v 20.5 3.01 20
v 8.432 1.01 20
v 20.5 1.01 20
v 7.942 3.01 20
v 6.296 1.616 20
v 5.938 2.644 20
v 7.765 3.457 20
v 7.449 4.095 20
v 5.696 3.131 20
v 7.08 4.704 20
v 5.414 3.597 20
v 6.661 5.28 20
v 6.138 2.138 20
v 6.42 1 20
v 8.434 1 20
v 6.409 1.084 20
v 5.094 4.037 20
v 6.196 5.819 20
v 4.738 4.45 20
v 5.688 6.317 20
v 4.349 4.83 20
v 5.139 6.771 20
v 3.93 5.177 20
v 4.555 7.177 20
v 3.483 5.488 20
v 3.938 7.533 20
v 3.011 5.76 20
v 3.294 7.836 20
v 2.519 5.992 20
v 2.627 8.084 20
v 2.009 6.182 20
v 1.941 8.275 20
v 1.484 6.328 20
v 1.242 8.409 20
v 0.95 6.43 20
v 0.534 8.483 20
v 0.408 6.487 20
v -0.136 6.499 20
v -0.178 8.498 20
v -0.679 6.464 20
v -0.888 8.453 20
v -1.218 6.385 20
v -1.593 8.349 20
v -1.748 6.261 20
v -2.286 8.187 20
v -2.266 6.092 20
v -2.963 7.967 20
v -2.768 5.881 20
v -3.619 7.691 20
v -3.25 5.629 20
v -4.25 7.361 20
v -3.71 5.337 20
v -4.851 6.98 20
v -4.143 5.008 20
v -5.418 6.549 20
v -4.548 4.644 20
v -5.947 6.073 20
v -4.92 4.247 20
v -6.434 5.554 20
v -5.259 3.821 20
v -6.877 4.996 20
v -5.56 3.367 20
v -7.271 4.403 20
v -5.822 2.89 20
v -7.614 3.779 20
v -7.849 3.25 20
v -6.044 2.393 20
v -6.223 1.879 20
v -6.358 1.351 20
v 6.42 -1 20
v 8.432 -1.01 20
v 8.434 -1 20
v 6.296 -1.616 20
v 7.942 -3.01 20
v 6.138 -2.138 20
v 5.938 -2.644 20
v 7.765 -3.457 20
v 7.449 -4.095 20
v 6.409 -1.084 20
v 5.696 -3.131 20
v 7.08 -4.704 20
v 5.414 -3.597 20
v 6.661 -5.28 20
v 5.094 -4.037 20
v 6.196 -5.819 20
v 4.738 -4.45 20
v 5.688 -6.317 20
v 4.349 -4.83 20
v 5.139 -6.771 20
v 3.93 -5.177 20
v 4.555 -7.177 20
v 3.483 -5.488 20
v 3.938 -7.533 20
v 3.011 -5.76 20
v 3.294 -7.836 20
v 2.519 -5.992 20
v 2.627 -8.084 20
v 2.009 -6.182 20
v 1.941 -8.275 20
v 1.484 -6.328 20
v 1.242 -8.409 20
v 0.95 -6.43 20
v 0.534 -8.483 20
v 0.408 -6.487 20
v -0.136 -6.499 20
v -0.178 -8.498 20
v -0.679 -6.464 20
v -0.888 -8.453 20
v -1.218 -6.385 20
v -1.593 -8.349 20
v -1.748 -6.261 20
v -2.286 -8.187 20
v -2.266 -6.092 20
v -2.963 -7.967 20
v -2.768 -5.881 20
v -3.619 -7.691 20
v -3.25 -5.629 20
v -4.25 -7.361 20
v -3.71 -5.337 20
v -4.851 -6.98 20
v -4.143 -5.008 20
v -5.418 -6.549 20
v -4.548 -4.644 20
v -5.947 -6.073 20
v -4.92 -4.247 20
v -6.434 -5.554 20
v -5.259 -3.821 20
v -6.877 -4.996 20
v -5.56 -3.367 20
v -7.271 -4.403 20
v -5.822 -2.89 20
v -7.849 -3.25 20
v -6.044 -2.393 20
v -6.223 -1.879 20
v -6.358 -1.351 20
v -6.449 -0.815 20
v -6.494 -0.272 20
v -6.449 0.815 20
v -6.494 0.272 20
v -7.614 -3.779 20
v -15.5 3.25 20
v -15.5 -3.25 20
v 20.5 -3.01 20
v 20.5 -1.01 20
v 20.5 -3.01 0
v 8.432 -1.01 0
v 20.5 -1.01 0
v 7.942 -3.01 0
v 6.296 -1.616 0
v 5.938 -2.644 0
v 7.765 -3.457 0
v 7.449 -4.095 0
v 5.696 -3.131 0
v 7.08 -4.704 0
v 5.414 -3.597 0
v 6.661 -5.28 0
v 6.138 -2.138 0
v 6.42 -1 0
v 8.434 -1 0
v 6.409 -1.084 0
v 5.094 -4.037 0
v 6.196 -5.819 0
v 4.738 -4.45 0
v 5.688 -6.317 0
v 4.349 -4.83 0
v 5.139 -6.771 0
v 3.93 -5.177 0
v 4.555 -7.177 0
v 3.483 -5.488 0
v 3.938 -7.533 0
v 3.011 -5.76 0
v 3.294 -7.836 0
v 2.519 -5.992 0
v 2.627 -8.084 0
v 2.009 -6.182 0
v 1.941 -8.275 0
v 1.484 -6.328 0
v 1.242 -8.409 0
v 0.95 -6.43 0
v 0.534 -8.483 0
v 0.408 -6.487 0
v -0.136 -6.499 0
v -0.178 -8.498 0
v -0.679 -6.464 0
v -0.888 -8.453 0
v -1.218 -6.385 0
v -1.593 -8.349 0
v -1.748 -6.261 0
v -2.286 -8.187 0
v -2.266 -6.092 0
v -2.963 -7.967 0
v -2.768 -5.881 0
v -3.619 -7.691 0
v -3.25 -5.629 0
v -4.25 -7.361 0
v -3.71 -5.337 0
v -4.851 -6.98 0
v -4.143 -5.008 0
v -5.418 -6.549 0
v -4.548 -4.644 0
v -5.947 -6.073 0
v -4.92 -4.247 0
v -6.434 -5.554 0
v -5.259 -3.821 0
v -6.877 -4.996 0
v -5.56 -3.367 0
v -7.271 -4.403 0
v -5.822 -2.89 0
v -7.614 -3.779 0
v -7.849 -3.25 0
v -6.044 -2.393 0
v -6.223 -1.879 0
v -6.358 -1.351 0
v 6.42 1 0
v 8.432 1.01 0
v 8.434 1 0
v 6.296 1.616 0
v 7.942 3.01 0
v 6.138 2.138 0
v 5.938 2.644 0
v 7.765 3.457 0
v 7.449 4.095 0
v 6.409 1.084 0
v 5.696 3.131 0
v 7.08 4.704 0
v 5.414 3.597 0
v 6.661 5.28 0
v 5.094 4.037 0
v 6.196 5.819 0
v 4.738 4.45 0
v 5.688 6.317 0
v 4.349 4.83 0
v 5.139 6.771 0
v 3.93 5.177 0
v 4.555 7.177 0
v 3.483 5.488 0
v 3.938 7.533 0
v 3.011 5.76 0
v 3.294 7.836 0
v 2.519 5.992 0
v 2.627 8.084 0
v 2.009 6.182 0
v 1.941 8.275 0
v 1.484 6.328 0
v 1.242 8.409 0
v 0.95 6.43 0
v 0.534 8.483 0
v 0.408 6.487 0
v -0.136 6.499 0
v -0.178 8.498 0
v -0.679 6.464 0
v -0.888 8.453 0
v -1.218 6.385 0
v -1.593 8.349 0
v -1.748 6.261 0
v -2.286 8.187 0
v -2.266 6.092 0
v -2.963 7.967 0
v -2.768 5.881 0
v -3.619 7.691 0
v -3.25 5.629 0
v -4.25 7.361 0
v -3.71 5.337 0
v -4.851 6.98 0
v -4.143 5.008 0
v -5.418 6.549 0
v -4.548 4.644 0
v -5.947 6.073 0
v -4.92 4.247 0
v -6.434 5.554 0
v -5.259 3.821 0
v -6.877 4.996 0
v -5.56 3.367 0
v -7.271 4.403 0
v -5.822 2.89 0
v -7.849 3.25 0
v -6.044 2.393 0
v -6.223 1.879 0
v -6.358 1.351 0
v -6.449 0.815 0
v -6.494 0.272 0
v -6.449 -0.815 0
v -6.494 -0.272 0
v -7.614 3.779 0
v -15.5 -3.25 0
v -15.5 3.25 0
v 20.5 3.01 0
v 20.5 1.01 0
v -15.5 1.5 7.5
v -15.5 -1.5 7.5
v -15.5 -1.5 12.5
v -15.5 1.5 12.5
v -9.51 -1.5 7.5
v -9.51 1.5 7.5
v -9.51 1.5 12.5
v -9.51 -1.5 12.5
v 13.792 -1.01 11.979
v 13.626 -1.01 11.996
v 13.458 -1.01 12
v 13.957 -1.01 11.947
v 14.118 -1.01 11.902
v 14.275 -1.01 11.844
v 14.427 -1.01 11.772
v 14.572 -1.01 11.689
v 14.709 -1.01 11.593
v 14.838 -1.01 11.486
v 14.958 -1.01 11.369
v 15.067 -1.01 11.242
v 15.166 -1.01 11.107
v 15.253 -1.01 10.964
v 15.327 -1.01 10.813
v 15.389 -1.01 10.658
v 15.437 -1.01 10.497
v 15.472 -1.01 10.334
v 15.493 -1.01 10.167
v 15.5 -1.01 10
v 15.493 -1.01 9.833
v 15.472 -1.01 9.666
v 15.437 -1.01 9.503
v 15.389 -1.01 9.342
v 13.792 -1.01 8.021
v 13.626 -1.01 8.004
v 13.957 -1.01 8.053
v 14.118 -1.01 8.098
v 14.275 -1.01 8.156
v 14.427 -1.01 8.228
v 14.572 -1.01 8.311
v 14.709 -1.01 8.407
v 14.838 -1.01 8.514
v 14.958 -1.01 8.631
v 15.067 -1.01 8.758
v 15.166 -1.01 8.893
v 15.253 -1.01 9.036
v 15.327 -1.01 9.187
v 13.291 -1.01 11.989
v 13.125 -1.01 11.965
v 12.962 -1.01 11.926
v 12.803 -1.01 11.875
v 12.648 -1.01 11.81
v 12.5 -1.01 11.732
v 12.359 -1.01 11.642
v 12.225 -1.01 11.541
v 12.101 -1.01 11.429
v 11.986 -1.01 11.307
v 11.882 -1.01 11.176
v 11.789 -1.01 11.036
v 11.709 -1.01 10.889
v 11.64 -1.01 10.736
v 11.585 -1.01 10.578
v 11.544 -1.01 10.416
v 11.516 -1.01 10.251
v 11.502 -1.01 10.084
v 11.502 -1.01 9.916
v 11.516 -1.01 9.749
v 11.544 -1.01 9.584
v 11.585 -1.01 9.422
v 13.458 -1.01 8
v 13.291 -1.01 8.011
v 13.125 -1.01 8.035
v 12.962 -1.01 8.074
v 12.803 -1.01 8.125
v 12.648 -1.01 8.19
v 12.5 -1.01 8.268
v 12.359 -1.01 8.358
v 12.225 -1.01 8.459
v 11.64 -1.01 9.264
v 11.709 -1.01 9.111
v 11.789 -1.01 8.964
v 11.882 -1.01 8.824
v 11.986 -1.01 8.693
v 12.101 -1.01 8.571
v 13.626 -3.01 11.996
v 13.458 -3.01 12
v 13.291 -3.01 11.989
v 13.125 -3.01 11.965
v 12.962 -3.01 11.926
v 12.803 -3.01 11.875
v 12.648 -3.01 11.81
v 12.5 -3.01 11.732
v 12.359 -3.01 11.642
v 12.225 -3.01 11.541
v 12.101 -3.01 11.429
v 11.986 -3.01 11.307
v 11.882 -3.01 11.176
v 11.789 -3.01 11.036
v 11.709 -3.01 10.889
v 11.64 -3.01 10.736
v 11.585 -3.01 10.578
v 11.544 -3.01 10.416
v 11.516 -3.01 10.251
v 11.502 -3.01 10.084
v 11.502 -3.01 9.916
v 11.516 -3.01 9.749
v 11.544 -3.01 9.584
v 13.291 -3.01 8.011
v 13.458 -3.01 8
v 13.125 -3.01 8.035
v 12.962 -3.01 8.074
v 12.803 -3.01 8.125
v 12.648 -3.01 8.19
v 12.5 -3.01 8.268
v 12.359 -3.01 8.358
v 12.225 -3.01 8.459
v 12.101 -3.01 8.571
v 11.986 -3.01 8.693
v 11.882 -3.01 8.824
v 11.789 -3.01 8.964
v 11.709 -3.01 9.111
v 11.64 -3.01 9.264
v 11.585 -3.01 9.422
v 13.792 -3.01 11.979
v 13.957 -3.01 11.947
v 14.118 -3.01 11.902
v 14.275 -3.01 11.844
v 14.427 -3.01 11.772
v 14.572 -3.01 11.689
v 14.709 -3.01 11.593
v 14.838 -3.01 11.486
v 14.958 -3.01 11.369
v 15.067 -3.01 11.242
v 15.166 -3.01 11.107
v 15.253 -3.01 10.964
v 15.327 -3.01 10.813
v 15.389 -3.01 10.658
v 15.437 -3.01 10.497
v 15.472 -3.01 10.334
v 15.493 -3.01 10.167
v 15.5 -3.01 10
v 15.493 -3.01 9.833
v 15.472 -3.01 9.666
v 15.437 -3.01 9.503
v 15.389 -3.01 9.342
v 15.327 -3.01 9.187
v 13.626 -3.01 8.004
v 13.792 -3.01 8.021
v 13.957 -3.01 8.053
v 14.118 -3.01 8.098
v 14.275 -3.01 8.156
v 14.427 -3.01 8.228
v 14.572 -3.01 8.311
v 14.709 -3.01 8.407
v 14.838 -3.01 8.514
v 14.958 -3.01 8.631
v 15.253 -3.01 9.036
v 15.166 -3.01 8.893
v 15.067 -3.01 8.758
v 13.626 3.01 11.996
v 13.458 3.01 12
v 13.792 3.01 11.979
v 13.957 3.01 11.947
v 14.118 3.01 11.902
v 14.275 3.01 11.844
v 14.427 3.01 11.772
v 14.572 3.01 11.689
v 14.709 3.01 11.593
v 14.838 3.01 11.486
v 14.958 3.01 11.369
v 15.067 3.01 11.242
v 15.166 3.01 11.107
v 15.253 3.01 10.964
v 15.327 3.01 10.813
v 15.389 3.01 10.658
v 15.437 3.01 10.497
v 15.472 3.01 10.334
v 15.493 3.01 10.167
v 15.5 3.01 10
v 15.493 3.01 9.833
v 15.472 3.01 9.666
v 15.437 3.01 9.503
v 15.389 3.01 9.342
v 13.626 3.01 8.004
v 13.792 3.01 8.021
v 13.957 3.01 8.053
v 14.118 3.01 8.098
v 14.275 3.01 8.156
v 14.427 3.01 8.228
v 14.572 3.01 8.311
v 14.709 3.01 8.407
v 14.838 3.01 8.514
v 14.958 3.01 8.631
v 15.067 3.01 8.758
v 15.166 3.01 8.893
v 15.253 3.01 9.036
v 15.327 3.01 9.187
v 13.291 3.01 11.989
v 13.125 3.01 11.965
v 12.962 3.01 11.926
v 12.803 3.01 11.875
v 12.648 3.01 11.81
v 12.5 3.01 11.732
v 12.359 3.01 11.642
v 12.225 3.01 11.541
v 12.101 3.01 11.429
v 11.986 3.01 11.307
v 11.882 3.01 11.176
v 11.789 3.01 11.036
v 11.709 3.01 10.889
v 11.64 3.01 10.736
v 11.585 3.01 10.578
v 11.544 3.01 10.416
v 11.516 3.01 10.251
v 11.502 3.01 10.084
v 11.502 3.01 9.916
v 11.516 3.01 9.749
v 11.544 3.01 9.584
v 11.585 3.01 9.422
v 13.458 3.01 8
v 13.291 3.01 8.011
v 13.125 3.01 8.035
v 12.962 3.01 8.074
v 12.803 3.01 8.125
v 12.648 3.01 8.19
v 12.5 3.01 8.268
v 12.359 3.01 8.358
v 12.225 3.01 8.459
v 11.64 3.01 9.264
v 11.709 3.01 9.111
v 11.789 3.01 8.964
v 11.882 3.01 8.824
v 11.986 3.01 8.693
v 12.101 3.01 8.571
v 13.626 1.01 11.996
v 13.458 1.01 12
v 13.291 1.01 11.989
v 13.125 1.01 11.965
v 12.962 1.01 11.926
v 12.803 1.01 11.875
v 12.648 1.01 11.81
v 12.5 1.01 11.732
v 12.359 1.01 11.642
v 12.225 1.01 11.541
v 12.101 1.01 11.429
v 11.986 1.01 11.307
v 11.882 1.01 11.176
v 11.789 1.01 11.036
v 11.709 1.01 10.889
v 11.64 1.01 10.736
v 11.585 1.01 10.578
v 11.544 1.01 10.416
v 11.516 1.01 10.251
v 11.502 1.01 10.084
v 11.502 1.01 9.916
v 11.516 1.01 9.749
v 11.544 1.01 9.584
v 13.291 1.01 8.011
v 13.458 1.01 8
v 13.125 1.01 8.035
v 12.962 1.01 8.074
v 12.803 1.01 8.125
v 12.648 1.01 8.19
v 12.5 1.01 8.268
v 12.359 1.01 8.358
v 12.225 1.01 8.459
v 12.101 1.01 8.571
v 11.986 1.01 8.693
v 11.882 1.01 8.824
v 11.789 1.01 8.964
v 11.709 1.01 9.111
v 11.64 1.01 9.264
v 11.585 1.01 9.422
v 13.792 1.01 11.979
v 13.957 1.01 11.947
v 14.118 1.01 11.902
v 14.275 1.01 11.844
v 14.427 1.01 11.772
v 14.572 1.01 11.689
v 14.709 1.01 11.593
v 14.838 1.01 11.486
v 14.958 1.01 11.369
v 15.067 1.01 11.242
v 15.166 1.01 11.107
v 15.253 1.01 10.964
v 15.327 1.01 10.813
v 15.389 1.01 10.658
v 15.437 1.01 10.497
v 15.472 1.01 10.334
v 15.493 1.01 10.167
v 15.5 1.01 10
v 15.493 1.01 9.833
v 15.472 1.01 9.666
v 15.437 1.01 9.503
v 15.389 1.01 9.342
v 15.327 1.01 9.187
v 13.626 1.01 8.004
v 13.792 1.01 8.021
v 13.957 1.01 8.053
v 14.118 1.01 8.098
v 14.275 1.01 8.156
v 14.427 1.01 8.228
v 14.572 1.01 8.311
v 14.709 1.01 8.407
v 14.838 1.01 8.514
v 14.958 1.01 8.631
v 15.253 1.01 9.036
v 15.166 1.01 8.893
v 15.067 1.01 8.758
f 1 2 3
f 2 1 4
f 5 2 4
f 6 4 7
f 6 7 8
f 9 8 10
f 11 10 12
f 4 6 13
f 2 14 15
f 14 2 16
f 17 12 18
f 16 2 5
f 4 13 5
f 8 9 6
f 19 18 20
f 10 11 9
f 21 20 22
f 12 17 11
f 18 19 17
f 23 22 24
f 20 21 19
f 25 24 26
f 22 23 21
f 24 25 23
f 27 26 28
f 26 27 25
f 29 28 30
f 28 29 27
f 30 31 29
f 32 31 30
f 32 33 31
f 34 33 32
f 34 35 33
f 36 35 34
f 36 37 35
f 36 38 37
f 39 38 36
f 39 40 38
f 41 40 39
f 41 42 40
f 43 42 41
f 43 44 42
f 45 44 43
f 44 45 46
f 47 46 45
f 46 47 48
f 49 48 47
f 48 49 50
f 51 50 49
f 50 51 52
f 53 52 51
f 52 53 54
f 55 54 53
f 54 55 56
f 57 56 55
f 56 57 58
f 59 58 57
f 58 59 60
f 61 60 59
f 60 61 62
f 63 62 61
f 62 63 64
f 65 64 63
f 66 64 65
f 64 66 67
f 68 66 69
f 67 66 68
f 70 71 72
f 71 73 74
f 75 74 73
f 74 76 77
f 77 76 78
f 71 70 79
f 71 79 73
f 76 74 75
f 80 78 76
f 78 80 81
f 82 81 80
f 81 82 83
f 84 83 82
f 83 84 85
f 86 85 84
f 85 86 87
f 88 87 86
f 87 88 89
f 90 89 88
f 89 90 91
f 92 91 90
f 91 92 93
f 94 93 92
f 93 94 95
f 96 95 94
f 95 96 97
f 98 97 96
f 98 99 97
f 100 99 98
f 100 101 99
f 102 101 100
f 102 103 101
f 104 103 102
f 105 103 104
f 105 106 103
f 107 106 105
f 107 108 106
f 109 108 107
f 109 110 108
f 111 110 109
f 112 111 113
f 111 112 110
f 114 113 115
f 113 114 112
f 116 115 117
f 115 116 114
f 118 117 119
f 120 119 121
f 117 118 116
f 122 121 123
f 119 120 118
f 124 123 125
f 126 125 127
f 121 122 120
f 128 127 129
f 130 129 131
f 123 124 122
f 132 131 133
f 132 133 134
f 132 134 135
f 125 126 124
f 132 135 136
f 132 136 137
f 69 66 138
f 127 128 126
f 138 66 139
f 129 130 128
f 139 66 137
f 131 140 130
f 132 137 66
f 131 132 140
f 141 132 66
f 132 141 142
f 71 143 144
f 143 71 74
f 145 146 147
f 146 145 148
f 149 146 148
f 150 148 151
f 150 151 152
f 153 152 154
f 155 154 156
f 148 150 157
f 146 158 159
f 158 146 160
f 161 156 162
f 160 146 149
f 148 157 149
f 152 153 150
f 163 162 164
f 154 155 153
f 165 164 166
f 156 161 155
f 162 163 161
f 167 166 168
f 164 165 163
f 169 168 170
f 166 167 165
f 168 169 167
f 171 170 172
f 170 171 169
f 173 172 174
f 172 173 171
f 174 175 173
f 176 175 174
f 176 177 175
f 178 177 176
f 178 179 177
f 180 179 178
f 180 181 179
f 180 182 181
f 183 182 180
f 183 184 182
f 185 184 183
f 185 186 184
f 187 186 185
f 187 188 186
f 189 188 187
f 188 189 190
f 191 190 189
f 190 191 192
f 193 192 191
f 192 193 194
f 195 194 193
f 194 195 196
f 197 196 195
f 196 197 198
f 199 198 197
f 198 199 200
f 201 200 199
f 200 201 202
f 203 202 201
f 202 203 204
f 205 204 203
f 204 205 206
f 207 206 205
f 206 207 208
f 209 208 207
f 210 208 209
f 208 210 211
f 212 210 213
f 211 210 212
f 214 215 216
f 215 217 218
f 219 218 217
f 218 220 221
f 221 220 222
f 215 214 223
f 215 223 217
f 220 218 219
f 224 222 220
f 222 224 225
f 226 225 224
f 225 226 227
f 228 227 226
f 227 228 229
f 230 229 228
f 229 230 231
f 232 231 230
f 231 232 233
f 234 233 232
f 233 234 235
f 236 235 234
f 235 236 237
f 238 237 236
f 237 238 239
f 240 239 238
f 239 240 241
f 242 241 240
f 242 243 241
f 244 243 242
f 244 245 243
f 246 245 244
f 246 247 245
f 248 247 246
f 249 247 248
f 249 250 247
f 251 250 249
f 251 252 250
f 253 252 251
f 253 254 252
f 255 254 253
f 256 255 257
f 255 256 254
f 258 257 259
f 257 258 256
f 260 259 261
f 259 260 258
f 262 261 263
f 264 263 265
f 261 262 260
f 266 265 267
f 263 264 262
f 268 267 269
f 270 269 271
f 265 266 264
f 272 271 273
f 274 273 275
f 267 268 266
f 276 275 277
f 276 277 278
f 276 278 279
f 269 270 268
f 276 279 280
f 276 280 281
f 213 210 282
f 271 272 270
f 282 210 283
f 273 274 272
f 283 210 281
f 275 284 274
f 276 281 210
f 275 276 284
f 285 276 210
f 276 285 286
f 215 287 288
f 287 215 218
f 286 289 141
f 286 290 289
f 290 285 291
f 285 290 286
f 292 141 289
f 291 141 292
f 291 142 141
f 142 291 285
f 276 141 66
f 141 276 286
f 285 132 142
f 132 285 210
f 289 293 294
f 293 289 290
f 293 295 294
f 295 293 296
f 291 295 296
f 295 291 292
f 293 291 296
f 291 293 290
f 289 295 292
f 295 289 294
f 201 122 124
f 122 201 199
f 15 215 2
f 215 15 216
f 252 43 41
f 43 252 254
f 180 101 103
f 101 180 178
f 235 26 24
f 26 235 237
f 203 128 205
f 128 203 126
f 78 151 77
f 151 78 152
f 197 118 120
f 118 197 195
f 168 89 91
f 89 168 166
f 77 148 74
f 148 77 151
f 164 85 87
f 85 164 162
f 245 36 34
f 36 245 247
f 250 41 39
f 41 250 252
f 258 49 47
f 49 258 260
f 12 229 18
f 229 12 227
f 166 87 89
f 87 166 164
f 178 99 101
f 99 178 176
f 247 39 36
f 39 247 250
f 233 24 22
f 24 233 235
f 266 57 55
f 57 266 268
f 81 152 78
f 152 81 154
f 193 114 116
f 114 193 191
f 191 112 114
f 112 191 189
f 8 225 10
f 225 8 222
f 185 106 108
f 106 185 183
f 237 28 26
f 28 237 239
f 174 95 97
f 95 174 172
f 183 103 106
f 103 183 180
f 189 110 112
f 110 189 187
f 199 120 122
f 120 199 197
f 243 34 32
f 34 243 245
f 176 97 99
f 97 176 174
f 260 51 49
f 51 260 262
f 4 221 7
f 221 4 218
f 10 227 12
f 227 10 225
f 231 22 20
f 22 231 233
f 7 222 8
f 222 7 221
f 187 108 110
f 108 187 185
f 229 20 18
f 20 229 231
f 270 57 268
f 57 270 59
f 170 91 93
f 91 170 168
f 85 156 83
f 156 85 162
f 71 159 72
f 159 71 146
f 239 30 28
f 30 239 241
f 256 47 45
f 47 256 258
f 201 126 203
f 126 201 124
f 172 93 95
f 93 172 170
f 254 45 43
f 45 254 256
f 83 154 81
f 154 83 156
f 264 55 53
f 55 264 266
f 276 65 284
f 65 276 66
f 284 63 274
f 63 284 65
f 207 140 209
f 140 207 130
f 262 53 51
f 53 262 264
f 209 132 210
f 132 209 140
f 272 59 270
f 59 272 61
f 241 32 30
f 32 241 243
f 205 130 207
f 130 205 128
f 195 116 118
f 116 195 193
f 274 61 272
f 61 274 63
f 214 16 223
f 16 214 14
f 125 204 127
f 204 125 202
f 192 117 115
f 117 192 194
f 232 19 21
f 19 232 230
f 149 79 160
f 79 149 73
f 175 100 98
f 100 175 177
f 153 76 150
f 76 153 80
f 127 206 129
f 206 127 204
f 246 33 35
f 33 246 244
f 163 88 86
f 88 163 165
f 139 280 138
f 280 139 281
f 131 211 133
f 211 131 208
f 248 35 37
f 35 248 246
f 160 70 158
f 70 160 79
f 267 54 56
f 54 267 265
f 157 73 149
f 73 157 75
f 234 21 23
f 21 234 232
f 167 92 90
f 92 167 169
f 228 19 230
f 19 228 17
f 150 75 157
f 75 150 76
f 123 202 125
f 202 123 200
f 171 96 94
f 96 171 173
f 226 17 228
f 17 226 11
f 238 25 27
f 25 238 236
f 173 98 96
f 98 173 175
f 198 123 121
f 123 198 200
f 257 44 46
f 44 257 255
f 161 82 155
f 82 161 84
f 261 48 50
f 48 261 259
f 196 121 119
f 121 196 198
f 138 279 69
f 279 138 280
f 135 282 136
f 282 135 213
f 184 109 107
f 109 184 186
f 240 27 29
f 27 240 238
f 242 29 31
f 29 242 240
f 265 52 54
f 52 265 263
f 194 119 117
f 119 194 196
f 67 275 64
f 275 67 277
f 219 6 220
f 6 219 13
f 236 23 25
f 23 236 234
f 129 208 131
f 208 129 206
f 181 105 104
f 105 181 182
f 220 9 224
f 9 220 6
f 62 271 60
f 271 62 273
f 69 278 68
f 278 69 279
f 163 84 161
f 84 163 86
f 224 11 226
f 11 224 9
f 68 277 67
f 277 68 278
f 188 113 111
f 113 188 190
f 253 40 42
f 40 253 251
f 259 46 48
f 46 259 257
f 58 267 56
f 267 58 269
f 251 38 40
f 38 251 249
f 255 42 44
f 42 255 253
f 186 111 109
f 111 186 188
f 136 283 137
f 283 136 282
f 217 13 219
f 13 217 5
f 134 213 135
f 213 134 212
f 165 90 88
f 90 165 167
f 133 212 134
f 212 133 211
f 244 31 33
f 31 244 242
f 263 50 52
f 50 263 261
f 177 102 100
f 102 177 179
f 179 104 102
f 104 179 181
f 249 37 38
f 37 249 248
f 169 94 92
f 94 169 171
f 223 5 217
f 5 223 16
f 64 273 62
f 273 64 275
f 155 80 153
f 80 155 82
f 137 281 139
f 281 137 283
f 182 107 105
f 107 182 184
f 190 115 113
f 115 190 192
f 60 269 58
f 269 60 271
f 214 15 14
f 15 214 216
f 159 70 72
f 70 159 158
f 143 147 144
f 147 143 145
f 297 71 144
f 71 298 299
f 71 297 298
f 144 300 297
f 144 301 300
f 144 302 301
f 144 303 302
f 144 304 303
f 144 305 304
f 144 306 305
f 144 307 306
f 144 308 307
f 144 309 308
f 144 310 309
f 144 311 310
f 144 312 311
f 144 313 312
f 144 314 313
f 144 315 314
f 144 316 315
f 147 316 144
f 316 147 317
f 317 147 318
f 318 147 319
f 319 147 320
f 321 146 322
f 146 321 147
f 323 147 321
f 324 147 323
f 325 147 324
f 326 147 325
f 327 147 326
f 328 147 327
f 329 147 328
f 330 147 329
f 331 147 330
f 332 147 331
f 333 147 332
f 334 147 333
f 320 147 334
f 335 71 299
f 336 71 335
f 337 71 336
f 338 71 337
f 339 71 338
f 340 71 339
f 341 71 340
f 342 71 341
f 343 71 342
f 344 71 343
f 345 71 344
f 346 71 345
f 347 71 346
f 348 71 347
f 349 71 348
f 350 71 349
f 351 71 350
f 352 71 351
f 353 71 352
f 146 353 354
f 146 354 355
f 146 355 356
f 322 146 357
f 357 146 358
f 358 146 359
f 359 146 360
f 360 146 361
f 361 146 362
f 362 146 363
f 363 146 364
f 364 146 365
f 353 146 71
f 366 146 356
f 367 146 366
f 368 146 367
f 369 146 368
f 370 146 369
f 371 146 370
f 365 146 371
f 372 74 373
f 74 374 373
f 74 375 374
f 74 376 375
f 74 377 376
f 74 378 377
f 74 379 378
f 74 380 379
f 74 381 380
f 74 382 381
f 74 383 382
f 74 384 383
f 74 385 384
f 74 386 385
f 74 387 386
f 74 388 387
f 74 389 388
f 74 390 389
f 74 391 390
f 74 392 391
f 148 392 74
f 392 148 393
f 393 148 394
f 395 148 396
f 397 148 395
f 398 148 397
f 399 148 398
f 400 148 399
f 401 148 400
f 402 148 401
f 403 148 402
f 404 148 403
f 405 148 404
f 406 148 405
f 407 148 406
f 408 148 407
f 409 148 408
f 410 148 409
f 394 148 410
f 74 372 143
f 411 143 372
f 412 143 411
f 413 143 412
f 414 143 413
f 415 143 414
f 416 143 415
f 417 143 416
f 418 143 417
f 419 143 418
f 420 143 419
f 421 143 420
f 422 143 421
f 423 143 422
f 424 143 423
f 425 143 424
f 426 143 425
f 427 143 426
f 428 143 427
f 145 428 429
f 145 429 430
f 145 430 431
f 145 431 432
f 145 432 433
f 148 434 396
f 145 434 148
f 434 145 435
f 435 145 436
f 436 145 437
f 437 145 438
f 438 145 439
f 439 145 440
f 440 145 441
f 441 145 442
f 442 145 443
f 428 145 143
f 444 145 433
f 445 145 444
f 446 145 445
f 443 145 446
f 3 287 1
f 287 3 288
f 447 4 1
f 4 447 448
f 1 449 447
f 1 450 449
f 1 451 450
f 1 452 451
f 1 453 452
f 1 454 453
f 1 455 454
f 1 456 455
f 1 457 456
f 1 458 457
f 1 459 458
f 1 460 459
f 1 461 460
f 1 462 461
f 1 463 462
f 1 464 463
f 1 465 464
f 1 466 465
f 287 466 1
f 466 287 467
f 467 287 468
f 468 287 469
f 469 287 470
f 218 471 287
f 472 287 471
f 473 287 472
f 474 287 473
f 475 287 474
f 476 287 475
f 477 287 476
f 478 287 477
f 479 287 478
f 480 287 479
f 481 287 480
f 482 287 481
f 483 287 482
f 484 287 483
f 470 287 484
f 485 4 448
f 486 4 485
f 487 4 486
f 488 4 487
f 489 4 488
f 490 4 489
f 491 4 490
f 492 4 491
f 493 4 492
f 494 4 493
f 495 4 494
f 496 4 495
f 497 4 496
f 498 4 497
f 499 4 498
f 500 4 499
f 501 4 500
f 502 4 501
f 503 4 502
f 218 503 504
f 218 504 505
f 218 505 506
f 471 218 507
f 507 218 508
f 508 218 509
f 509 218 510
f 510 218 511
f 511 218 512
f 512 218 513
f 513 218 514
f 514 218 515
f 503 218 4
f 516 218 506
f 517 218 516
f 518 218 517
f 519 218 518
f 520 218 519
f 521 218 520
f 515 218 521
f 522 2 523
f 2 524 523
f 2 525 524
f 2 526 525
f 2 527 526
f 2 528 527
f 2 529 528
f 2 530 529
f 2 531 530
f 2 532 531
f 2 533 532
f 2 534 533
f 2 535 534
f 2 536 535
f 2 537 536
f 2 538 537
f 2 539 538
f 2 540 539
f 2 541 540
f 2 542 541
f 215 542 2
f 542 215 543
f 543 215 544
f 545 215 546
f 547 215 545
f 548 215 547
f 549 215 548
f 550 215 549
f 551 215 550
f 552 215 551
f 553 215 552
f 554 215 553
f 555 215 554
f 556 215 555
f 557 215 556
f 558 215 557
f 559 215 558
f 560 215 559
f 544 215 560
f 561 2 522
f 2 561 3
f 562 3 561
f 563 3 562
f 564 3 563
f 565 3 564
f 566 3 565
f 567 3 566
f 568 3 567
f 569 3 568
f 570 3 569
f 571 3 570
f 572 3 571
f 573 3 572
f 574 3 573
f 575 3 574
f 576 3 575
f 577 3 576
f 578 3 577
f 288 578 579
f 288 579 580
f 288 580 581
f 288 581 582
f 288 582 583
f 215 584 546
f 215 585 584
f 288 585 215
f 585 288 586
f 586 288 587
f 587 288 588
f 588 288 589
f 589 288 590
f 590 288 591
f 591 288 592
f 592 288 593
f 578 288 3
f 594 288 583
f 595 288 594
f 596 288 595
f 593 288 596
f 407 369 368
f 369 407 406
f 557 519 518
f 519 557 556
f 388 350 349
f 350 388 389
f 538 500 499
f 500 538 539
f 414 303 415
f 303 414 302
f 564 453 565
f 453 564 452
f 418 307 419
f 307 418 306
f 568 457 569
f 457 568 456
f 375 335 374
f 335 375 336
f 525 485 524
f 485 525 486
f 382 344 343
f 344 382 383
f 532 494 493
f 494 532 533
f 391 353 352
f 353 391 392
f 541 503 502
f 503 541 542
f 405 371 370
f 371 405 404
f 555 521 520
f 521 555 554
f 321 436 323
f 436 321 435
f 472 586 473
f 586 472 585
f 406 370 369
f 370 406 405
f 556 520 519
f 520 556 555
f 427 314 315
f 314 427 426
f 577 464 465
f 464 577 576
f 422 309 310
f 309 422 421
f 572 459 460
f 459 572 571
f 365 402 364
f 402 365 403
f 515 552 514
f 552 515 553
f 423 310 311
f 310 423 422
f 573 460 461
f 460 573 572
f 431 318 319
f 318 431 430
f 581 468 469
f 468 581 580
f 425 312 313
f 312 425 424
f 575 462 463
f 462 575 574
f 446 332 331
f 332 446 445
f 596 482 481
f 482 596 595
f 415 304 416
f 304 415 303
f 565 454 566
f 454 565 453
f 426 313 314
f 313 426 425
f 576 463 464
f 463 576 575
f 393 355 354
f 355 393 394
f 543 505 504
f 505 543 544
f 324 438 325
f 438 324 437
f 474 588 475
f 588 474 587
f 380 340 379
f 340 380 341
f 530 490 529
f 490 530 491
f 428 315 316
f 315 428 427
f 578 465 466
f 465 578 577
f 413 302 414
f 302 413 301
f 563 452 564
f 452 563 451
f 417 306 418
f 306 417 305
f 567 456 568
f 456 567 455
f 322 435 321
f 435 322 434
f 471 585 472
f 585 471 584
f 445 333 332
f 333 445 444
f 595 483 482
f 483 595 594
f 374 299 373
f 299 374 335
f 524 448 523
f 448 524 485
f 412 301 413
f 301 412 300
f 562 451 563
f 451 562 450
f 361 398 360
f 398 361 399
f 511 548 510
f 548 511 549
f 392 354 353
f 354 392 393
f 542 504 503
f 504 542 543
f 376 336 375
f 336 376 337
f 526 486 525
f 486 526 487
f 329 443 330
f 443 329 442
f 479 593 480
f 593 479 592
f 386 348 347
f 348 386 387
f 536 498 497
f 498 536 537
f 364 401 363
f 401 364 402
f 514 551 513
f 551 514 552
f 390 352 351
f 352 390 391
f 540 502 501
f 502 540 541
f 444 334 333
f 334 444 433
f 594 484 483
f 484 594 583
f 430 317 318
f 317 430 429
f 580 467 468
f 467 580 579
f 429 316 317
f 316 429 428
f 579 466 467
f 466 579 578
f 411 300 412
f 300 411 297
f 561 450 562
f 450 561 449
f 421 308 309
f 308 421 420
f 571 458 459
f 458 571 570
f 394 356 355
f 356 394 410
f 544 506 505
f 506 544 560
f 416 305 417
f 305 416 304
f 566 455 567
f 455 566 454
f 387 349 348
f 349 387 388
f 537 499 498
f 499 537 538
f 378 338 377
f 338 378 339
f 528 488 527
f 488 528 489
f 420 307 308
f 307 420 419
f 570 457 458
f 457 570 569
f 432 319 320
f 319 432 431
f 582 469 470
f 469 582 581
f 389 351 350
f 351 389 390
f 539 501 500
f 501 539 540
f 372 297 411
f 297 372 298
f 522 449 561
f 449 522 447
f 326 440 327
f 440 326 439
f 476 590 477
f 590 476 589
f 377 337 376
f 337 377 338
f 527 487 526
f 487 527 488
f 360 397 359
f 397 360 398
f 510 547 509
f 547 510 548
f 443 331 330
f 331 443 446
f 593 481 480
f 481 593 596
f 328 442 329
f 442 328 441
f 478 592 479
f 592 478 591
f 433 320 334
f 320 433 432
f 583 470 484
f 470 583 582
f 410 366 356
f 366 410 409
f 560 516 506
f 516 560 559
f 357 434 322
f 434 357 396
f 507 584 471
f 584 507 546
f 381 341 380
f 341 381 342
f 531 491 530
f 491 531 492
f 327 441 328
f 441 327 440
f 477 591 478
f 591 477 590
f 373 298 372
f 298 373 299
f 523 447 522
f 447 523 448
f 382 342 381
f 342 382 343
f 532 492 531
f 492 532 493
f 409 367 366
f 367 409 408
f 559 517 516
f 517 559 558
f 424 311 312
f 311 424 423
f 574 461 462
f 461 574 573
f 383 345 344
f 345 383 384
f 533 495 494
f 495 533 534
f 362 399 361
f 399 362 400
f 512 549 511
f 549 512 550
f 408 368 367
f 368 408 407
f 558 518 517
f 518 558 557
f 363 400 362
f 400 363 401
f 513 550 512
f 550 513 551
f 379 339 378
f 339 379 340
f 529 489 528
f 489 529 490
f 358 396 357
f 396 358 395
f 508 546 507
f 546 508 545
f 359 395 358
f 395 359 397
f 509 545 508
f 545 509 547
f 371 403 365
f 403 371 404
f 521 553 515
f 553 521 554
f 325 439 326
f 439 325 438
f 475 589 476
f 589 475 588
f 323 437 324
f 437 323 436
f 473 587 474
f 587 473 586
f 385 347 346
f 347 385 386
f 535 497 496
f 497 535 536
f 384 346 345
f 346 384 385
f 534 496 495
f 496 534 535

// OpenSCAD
// file: metrics.scad
/* [General] */
mount_wall_thickness = 2;


/* [Motor] */
motor_d = 28.5;
motor_h = 20;

motor_square_w = 18.5;
motor_square_h = 5.5 * 2;

motor_mount_w = 7.5;

motor_hole_w = 10.5;

/* [Motor Ending] */
motor_ending_w = 3;
motor_ending_h = 5;
motor_ending_l = 6;

/* [Motor Mount] */
motor_mount_thickness = 7 + mount_wall_thickness;


/* [Hidden] */
_fn = 75;
preview_margin = 0.01;

/* [Laser pointer] */
laser_pointer_holder_l = 20;
laser_pointer_d = 13;
screw_terminal_length = 14;

/* [Screw] */
//the diameter of the screw
screw_d = 4;
// main file
include <metrics.scad>



module laser_pointer_holder(){
    union(){

        //motor mount
        difference(){
            //holder
            translate([-(motor_mount_thickness + laser_pointer_d/2),
                        -laser_pointer_d/4,
                        0]){
                cube([motor_mount_thickness, laser_pointer_d/2, laser_pointer_holder_l]);
            }

            //hole
            translate([- laser_pointer_d/2 - motor_mount_thickness - preview_margin,
                        -motor_ending_w/2,
                        laser_pointer_holder_l/2 + motor_ending_h/2]) {

                rotate([0, 90, 0]){
                    cube([motor_ending_h, motor_ending_w, motor_ending_l]);
                }
            }
        }

        //laser pointer hole
        difference(){
            //shell
            cylinder(h=laser_pointer_holder_l,
                    d1=laser_pointer_d + mount_wall_thickness*2, d2=laser_pointer_d + mount_wall_thickness*2, $fn=_fn);

            //remove space for the pointer
            translate([0, 0, -preview_margin]) {
                cylinder(h=laser_pointer_holder_l + preview_margin*2, d1=laser_pointer_d, d2=laser_pointer_d, $fn=_fn);
            };

            //space for the screw to fasten
            translate([0, -mount_wall_thickness/2, -preview_margin]){
                cube([laser_pointer_d/2 + mount_wall_thickness, mount_wall_thickness, laser_pointer_holder_l + 2*preview_margin]);
            }
        }

        //fastener
        difference(){
            union(){
                //left side of the screw terminal
                translate([laser_pointer_d/2, -mount_wall_thickness * 3/2 - preview_margin, 0]){
                    cube([screw_terminal_length, mount_wall_thickness, laser_pointer_holder_l]);
                }

                //right side of the screw terminal
                translate([laser_pointer_d/2, mount_wall_thickness/2 + preview_margin, 0]){
                    cube([screw_terminal_length, mount_wall_thickness, laser_pointer_holder_l]);
                }
            }

            //cut out a screw
            translate([laser_pointer_d/2 + screw_terminal_length/2, laser_pointer_d/2, laser_pointer_holder_l/2]) {
                rotate([90, 0, 0]){
                    cylinder(h=laser_pointer_d, d1=screw_d, d2=screw_d, $fn=_fn);
                }
            }
        }
    }
}

//main
laser_pointer_holder();
//animation
$vpt = [0, 0, laser_pointer_holder_l/2];

$vpr = [60, 0, 360 * $t];

$vpd = 200;
